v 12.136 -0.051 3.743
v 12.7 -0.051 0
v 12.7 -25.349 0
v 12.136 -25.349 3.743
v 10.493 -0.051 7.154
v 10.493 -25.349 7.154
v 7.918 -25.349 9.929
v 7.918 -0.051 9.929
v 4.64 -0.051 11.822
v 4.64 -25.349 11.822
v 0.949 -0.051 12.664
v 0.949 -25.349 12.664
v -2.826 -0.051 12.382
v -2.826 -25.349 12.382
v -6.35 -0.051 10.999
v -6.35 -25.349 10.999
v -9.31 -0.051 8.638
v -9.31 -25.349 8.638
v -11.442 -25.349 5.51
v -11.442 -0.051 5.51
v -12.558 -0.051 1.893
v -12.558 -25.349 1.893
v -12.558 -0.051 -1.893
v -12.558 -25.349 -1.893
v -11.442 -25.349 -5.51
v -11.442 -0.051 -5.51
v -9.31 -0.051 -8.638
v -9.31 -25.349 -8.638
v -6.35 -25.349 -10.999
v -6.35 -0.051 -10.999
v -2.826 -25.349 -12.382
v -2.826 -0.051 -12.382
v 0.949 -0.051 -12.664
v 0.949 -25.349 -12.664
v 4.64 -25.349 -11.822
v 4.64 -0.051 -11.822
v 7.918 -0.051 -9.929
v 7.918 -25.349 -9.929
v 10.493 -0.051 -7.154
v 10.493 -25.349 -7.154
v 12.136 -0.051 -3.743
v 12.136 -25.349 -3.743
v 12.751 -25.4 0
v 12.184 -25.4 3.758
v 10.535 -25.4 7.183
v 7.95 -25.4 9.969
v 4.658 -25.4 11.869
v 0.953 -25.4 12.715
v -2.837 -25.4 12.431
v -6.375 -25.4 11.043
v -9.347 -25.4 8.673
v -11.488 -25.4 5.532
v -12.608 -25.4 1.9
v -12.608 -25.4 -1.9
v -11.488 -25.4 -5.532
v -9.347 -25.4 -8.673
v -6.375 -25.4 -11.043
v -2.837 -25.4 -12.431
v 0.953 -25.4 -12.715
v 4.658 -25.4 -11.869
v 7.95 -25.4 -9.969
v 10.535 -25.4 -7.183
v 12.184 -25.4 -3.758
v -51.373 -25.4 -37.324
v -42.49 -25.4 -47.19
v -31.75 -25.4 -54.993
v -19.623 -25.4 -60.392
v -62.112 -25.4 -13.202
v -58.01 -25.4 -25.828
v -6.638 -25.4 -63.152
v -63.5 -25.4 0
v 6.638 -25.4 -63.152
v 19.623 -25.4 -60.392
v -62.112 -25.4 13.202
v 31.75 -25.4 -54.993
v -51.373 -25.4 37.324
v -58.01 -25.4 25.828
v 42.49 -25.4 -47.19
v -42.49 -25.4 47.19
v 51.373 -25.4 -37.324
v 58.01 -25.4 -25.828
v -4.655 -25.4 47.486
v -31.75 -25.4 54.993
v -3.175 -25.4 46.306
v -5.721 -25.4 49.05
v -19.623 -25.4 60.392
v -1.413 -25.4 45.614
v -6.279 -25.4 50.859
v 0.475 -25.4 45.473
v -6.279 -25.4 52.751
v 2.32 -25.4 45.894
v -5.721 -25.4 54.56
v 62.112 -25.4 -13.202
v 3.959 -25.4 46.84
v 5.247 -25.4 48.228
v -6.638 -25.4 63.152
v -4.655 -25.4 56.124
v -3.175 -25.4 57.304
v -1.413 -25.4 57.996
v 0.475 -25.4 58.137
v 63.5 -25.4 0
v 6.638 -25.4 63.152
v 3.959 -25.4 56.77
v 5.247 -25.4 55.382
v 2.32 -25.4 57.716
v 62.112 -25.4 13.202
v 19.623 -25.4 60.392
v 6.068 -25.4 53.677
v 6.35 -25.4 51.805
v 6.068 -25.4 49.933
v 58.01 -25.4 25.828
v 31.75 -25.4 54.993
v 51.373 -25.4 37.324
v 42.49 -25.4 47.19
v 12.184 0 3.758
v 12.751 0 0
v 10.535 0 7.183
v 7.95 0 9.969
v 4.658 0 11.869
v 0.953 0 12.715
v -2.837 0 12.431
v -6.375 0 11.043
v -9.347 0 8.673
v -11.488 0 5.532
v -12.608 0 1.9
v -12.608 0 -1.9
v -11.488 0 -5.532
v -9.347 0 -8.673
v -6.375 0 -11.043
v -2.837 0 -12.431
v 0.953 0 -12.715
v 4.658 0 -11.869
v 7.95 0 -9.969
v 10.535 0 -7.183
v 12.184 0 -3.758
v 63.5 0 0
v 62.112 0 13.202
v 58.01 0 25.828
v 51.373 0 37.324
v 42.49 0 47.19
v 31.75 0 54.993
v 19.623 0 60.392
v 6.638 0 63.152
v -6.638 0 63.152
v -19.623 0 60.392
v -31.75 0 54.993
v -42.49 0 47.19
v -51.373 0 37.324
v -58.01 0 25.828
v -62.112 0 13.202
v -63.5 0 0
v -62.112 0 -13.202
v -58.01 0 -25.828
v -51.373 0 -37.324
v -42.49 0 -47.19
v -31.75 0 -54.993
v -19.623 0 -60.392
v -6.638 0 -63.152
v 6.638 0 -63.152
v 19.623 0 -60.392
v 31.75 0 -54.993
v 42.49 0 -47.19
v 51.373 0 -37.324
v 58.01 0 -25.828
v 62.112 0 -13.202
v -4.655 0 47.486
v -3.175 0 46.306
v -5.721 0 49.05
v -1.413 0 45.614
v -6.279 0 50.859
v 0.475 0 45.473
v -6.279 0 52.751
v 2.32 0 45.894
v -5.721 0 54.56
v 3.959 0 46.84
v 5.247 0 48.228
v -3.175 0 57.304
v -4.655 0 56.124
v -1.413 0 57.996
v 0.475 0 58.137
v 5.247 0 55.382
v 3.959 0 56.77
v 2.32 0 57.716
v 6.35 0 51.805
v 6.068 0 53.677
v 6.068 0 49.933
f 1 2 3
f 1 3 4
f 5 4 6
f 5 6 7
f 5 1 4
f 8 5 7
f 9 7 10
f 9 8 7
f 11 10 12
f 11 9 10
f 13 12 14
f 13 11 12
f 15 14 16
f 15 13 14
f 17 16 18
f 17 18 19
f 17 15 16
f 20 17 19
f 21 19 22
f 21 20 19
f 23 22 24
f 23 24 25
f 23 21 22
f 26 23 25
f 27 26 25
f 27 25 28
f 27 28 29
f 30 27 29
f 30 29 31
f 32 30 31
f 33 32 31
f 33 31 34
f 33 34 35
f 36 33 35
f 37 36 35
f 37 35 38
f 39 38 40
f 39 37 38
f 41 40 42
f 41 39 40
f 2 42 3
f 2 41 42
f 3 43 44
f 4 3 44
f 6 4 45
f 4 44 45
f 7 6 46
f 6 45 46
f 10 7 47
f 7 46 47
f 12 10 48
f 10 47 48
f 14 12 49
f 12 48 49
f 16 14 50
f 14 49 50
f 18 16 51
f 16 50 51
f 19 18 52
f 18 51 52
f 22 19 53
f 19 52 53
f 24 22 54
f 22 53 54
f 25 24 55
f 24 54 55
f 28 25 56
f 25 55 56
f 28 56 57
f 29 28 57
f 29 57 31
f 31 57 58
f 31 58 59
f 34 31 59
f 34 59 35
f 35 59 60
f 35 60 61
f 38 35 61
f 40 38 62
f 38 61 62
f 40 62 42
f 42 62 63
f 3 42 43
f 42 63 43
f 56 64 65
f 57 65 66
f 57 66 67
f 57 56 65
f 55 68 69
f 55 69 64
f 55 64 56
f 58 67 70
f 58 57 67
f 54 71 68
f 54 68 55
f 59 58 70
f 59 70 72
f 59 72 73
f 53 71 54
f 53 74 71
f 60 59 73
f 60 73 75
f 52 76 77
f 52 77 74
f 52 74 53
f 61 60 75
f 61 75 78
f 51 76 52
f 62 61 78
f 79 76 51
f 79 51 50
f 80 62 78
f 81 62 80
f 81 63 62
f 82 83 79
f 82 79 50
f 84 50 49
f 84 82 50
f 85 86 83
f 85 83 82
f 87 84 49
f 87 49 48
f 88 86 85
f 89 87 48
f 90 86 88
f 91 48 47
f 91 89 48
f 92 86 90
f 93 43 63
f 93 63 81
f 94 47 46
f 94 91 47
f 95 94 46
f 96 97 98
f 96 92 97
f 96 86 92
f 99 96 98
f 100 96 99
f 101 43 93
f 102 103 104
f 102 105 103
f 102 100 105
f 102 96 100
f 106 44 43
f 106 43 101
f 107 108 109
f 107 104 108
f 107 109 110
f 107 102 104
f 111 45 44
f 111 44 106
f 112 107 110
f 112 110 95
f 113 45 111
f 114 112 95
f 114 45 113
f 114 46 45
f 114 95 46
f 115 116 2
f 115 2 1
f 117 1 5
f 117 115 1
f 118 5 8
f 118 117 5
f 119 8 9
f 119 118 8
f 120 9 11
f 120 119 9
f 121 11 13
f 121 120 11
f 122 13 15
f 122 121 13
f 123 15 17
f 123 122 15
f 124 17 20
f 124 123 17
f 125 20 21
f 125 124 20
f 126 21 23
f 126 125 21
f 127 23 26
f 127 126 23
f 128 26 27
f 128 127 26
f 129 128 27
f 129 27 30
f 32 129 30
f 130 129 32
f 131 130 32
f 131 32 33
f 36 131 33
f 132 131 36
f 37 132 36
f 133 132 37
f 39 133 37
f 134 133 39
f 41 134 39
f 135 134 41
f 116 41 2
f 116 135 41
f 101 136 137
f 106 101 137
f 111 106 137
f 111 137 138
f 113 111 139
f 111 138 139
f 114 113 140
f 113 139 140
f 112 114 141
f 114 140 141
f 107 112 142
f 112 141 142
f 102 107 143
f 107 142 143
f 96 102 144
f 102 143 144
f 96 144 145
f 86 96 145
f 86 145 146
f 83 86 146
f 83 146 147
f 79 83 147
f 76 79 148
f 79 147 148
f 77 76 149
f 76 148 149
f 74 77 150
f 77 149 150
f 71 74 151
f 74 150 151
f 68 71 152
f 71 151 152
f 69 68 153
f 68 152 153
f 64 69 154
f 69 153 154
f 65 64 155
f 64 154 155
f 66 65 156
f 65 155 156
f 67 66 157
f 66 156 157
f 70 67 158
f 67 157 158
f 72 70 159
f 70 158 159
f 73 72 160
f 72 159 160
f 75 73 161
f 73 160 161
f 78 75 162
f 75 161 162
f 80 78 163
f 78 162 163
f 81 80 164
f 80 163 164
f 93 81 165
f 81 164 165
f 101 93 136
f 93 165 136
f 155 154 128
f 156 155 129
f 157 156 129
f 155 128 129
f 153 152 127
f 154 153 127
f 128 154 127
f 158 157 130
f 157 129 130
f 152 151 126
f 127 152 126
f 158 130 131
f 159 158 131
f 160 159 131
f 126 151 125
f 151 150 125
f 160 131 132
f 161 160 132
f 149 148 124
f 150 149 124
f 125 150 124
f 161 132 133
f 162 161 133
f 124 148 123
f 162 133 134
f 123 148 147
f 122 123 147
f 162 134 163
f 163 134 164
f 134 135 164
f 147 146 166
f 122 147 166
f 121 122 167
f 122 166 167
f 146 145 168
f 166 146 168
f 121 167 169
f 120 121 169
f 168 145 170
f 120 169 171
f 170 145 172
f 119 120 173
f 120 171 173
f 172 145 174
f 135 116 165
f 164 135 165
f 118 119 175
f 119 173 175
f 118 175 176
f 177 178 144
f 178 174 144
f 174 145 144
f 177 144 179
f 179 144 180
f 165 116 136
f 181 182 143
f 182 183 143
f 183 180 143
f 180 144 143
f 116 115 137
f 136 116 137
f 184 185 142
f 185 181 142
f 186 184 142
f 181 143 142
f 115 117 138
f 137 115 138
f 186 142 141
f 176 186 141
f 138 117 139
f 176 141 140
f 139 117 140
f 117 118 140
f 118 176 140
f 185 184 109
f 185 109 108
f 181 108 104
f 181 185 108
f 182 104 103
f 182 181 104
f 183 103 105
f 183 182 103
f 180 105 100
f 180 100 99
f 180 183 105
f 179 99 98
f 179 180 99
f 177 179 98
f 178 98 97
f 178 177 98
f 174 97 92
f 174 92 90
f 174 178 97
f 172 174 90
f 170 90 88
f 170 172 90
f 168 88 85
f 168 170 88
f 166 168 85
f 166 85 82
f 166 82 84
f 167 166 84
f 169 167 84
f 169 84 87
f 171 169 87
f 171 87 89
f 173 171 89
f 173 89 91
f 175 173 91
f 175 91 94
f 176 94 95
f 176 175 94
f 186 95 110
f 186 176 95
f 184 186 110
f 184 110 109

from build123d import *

# Parameters (mm, degrees)
F0_R     = 63.5
F0_R_2   = 12.7
F0_R_3   = 6.35
F1_DEPTH = 25.4
F2_SIZE  = 0.0508


with BuildPart() as f1:
    # F0 (on Front) → F1 (new body)
    with BuildSketch(Plane.XZ):
        Circle(F0_R)
        Circle(F0_R_2, mode=Mode.SUBTRACT)
        with Locations((0, 51.805038)):
            Circle(F0_R_3, mode=Mode.SUBTRACT)
    extrude(amount=F1_DEPTH)

    # F2
    f2_edges = [f1.edges().sort_by_distance(p)[0] for p in [
        (12.7, -12.7, 0),
        (-12.7, 0, 0),
        (-12.7, -25.4, 0),
    ]]
    chamfer(f2_edges, length=F2_SIZE)


solid = f1.part
